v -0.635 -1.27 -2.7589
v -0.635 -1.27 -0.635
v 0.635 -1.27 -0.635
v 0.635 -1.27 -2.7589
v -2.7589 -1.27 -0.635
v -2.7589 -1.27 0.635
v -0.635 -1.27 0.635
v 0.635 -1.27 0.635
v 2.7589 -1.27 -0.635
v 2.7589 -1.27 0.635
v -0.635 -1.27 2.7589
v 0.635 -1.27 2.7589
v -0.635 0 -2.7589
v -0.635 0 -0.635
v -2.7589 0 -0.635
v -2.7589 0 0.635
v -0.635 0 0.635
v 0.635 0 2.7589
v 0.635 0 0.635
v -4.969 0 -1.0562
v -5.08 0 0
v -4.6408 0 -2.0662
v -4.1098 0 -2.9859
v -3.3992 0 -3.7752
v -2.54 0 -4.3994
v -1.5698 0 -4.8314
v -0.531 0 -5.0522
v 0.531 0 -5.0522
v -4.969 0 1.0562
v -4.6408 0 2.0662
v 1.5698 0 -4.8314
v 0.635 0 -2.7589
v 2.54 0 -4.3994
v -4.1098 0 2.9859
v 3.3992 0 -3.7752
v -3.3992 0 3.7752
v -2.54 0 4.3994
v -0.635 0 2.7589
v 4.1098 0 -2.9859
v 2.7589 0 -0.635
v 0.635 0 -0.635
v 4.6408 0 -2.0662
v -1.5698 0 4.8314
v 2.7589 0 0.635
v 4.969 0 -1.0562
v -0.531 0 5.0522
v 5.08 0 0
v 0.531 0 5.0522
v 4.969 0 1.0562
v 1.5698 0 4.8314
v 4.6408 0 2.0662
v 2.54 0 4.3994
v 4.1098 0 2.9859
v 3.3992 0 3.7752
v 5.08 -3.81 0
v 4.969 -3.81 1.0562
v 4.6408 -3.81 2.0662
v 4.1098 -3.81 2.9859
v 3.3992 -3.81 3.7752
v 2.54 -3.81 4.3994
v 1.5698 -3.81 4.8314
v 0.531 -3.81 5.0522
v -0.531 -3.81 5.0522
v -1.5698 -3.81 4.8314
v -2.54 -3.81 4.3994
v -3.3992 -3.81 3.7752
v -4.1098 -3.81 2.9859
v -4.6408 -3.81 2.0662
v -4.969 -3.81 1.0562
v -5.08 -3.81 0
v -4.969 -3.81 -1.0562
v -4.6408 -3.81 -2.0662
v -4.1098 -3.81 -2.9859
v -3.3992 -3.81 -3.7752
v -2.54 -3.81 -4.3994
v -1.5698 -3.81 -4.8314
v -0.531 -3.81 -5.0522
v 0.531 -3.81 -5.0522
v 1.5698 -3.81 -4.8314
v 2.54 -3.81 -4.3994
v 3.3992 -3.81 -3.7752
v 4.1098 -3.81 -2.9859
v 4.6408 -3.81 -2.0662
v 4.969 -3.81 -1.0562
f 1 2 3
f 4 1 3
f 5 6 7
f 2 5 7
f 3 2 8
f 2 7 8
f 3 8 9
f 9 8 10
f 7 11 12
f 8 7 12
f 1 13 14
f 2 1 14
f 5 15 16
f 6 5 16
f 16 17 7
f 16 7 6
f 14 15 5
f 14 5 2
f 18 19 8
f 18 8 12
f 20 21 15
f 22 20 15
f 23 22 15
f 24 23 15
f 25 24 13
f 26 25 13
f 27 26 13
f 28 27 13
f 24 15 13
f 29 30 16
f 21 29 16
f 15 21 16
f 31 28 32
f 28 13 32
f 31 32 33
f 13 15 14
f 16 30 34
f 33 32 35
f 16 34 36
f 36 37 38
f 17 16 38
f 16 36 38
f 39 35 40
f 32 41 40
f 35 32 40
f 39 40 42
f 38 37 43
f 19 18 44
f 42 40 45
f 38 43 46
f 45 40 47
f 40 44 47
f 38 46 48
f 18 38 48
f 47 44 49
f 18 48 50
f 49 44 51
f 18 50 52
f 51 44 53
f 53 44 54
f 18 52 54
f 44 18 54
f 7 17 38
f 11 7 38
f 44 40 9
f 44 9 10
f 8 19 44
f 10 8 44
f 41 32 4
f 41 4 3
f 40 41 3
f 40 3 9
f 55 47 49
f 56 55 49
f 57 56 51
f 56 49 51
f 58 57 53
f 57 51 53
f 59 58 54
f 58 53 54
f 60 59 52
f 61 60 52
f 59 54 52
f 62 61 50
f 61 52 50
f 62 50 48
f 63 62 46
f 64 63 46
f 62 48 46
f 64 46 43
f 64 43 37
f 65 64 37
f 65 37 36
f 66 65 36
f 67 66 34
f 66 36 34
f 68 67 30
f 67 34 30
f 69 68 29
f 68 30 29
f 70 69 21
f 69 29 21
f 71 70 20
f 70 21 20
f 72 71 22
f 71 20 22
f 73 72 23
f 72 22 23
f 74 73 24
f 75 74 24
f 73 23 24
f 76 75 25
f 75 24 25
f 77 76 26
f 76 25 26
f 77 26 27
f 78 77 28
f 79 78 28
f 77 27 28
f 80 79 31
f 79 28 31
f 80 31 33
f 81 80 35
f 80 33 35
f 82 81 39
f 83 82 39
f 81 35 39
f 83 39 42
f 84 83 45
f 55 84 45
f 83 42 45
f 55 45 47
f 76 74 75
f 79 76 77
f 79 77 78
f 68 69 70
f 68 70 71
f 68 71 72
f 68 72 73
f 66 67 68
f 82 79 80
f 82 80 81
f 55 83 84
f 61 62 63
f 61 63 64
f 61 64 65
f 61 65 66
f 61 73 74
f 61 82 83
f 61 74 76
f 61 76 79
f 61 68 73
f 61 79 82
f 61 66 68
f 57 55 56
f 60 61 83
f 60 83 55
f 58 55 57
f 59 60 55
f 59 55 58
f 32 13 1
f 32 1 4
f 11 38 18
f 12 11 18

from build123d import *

# Parameters (mm, degrees)
F0_R     = 5.08
F1_DEPTH = 3.81
F2_W     = 2.1238556986
F2_H     = 1.27
F2_W_2   = 1.27
F2_H_2   = 2.1238556986
F3_DEPTH = 1.27


with BuildPart() as f1:
    # F0 (on Front) → F1 (new body)
    with BuildSketch(Plane.XZ):
        Circle(F0_R)
    extrude(amount=F1_DEPTH)

    # F2 (on Front) → F3 (cut)
    with BuildSketch(Plane.XZ):
        with Locations((-1.6969278493, 0)):
            Rectangle(F2_W, F2_H)
        Rectangle(F2_W_2, F2_H)
        with Locations((0, 1.6969278493)):
            Rectangle(F2_W_2, F2_H_2)
        with Locations((1.6969278493, 0)):
            Rectangle(F2_W, F2_H)
        with Locations((0, -1.6969278493)):
            Rectangle(F2_W_2, F2_H_2)
    extrude(amount=F3_DEPTH, mode=Mode.SUBTRACT)


solid = f1.part
